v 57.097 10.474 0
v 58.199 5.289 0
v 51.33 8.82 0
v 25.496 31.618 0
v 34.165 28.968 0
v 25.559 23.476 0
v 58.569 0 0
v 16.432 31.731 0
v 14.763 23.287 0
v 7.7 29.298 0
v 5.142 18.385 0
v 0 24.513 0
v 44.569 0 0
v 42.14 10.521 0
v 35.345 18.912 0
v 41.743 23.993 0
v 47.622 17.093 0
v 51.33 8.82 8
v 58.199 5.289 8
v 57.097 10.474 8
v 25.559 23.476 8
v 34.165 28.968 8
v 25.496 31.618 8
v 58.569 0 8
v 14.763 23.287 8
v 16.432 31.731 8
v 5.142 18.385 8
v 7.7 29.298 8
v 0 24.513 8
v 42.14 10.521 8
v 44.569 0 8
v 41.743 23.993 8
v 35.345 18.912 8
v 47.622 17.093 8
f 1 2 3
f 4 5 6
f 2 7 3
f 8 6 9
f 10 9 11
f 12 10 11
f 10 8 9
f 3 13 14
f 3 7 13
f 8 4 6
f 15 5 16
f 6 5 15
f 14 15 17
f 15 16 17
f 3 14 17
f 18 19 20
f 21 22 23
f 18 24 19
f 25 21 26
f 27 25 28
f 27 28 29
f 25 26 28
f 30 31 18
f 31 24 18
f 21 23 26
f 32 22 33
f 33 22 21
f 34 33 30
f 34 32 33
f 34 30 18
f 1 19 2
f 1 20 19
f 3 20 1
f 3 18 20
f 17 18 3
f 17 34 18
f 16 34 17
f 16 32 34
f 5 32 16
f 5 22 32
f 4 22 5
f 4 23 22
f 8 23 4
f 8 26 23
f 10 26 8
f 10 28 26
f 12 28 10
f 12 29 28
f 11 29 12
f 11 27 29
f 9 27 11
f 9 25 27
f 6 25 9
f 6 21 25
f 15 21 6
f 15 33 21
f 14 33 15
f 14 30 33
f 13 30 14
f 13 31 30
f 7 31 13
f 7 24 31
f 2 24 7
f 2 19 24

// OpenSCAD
$fn = 32;

// ----------------------------------------------------------------------
// Arc stop: segment, 8 mm thick
// ----------------------------------------------------------------------

// --- parameters (mm) ---
profile_height = 8;       // extrusion height
profile_points = 17;      // points of the closed outline

profile = [[58.569, 0], [58.199, 5.289], [57.097, 10.474], [51.33, 8.82], [47.622, 17.093], [41.743, 23.993], [34.165, 28.968], [25.496, 31.618], [16.432, 31.731], [7.7, 29.298], [0, 24.513], [5.142, 18.385], [14.763, 23.287], [25.559, 23.476], [35.345, 18.912], [42.14, 10.521], [44.569, 0]];  // single closed polygon, 17 points, counter clockwise

// --- the one profile operation ---
linear_extrude(height = profile_height) polygon(points = profile);
